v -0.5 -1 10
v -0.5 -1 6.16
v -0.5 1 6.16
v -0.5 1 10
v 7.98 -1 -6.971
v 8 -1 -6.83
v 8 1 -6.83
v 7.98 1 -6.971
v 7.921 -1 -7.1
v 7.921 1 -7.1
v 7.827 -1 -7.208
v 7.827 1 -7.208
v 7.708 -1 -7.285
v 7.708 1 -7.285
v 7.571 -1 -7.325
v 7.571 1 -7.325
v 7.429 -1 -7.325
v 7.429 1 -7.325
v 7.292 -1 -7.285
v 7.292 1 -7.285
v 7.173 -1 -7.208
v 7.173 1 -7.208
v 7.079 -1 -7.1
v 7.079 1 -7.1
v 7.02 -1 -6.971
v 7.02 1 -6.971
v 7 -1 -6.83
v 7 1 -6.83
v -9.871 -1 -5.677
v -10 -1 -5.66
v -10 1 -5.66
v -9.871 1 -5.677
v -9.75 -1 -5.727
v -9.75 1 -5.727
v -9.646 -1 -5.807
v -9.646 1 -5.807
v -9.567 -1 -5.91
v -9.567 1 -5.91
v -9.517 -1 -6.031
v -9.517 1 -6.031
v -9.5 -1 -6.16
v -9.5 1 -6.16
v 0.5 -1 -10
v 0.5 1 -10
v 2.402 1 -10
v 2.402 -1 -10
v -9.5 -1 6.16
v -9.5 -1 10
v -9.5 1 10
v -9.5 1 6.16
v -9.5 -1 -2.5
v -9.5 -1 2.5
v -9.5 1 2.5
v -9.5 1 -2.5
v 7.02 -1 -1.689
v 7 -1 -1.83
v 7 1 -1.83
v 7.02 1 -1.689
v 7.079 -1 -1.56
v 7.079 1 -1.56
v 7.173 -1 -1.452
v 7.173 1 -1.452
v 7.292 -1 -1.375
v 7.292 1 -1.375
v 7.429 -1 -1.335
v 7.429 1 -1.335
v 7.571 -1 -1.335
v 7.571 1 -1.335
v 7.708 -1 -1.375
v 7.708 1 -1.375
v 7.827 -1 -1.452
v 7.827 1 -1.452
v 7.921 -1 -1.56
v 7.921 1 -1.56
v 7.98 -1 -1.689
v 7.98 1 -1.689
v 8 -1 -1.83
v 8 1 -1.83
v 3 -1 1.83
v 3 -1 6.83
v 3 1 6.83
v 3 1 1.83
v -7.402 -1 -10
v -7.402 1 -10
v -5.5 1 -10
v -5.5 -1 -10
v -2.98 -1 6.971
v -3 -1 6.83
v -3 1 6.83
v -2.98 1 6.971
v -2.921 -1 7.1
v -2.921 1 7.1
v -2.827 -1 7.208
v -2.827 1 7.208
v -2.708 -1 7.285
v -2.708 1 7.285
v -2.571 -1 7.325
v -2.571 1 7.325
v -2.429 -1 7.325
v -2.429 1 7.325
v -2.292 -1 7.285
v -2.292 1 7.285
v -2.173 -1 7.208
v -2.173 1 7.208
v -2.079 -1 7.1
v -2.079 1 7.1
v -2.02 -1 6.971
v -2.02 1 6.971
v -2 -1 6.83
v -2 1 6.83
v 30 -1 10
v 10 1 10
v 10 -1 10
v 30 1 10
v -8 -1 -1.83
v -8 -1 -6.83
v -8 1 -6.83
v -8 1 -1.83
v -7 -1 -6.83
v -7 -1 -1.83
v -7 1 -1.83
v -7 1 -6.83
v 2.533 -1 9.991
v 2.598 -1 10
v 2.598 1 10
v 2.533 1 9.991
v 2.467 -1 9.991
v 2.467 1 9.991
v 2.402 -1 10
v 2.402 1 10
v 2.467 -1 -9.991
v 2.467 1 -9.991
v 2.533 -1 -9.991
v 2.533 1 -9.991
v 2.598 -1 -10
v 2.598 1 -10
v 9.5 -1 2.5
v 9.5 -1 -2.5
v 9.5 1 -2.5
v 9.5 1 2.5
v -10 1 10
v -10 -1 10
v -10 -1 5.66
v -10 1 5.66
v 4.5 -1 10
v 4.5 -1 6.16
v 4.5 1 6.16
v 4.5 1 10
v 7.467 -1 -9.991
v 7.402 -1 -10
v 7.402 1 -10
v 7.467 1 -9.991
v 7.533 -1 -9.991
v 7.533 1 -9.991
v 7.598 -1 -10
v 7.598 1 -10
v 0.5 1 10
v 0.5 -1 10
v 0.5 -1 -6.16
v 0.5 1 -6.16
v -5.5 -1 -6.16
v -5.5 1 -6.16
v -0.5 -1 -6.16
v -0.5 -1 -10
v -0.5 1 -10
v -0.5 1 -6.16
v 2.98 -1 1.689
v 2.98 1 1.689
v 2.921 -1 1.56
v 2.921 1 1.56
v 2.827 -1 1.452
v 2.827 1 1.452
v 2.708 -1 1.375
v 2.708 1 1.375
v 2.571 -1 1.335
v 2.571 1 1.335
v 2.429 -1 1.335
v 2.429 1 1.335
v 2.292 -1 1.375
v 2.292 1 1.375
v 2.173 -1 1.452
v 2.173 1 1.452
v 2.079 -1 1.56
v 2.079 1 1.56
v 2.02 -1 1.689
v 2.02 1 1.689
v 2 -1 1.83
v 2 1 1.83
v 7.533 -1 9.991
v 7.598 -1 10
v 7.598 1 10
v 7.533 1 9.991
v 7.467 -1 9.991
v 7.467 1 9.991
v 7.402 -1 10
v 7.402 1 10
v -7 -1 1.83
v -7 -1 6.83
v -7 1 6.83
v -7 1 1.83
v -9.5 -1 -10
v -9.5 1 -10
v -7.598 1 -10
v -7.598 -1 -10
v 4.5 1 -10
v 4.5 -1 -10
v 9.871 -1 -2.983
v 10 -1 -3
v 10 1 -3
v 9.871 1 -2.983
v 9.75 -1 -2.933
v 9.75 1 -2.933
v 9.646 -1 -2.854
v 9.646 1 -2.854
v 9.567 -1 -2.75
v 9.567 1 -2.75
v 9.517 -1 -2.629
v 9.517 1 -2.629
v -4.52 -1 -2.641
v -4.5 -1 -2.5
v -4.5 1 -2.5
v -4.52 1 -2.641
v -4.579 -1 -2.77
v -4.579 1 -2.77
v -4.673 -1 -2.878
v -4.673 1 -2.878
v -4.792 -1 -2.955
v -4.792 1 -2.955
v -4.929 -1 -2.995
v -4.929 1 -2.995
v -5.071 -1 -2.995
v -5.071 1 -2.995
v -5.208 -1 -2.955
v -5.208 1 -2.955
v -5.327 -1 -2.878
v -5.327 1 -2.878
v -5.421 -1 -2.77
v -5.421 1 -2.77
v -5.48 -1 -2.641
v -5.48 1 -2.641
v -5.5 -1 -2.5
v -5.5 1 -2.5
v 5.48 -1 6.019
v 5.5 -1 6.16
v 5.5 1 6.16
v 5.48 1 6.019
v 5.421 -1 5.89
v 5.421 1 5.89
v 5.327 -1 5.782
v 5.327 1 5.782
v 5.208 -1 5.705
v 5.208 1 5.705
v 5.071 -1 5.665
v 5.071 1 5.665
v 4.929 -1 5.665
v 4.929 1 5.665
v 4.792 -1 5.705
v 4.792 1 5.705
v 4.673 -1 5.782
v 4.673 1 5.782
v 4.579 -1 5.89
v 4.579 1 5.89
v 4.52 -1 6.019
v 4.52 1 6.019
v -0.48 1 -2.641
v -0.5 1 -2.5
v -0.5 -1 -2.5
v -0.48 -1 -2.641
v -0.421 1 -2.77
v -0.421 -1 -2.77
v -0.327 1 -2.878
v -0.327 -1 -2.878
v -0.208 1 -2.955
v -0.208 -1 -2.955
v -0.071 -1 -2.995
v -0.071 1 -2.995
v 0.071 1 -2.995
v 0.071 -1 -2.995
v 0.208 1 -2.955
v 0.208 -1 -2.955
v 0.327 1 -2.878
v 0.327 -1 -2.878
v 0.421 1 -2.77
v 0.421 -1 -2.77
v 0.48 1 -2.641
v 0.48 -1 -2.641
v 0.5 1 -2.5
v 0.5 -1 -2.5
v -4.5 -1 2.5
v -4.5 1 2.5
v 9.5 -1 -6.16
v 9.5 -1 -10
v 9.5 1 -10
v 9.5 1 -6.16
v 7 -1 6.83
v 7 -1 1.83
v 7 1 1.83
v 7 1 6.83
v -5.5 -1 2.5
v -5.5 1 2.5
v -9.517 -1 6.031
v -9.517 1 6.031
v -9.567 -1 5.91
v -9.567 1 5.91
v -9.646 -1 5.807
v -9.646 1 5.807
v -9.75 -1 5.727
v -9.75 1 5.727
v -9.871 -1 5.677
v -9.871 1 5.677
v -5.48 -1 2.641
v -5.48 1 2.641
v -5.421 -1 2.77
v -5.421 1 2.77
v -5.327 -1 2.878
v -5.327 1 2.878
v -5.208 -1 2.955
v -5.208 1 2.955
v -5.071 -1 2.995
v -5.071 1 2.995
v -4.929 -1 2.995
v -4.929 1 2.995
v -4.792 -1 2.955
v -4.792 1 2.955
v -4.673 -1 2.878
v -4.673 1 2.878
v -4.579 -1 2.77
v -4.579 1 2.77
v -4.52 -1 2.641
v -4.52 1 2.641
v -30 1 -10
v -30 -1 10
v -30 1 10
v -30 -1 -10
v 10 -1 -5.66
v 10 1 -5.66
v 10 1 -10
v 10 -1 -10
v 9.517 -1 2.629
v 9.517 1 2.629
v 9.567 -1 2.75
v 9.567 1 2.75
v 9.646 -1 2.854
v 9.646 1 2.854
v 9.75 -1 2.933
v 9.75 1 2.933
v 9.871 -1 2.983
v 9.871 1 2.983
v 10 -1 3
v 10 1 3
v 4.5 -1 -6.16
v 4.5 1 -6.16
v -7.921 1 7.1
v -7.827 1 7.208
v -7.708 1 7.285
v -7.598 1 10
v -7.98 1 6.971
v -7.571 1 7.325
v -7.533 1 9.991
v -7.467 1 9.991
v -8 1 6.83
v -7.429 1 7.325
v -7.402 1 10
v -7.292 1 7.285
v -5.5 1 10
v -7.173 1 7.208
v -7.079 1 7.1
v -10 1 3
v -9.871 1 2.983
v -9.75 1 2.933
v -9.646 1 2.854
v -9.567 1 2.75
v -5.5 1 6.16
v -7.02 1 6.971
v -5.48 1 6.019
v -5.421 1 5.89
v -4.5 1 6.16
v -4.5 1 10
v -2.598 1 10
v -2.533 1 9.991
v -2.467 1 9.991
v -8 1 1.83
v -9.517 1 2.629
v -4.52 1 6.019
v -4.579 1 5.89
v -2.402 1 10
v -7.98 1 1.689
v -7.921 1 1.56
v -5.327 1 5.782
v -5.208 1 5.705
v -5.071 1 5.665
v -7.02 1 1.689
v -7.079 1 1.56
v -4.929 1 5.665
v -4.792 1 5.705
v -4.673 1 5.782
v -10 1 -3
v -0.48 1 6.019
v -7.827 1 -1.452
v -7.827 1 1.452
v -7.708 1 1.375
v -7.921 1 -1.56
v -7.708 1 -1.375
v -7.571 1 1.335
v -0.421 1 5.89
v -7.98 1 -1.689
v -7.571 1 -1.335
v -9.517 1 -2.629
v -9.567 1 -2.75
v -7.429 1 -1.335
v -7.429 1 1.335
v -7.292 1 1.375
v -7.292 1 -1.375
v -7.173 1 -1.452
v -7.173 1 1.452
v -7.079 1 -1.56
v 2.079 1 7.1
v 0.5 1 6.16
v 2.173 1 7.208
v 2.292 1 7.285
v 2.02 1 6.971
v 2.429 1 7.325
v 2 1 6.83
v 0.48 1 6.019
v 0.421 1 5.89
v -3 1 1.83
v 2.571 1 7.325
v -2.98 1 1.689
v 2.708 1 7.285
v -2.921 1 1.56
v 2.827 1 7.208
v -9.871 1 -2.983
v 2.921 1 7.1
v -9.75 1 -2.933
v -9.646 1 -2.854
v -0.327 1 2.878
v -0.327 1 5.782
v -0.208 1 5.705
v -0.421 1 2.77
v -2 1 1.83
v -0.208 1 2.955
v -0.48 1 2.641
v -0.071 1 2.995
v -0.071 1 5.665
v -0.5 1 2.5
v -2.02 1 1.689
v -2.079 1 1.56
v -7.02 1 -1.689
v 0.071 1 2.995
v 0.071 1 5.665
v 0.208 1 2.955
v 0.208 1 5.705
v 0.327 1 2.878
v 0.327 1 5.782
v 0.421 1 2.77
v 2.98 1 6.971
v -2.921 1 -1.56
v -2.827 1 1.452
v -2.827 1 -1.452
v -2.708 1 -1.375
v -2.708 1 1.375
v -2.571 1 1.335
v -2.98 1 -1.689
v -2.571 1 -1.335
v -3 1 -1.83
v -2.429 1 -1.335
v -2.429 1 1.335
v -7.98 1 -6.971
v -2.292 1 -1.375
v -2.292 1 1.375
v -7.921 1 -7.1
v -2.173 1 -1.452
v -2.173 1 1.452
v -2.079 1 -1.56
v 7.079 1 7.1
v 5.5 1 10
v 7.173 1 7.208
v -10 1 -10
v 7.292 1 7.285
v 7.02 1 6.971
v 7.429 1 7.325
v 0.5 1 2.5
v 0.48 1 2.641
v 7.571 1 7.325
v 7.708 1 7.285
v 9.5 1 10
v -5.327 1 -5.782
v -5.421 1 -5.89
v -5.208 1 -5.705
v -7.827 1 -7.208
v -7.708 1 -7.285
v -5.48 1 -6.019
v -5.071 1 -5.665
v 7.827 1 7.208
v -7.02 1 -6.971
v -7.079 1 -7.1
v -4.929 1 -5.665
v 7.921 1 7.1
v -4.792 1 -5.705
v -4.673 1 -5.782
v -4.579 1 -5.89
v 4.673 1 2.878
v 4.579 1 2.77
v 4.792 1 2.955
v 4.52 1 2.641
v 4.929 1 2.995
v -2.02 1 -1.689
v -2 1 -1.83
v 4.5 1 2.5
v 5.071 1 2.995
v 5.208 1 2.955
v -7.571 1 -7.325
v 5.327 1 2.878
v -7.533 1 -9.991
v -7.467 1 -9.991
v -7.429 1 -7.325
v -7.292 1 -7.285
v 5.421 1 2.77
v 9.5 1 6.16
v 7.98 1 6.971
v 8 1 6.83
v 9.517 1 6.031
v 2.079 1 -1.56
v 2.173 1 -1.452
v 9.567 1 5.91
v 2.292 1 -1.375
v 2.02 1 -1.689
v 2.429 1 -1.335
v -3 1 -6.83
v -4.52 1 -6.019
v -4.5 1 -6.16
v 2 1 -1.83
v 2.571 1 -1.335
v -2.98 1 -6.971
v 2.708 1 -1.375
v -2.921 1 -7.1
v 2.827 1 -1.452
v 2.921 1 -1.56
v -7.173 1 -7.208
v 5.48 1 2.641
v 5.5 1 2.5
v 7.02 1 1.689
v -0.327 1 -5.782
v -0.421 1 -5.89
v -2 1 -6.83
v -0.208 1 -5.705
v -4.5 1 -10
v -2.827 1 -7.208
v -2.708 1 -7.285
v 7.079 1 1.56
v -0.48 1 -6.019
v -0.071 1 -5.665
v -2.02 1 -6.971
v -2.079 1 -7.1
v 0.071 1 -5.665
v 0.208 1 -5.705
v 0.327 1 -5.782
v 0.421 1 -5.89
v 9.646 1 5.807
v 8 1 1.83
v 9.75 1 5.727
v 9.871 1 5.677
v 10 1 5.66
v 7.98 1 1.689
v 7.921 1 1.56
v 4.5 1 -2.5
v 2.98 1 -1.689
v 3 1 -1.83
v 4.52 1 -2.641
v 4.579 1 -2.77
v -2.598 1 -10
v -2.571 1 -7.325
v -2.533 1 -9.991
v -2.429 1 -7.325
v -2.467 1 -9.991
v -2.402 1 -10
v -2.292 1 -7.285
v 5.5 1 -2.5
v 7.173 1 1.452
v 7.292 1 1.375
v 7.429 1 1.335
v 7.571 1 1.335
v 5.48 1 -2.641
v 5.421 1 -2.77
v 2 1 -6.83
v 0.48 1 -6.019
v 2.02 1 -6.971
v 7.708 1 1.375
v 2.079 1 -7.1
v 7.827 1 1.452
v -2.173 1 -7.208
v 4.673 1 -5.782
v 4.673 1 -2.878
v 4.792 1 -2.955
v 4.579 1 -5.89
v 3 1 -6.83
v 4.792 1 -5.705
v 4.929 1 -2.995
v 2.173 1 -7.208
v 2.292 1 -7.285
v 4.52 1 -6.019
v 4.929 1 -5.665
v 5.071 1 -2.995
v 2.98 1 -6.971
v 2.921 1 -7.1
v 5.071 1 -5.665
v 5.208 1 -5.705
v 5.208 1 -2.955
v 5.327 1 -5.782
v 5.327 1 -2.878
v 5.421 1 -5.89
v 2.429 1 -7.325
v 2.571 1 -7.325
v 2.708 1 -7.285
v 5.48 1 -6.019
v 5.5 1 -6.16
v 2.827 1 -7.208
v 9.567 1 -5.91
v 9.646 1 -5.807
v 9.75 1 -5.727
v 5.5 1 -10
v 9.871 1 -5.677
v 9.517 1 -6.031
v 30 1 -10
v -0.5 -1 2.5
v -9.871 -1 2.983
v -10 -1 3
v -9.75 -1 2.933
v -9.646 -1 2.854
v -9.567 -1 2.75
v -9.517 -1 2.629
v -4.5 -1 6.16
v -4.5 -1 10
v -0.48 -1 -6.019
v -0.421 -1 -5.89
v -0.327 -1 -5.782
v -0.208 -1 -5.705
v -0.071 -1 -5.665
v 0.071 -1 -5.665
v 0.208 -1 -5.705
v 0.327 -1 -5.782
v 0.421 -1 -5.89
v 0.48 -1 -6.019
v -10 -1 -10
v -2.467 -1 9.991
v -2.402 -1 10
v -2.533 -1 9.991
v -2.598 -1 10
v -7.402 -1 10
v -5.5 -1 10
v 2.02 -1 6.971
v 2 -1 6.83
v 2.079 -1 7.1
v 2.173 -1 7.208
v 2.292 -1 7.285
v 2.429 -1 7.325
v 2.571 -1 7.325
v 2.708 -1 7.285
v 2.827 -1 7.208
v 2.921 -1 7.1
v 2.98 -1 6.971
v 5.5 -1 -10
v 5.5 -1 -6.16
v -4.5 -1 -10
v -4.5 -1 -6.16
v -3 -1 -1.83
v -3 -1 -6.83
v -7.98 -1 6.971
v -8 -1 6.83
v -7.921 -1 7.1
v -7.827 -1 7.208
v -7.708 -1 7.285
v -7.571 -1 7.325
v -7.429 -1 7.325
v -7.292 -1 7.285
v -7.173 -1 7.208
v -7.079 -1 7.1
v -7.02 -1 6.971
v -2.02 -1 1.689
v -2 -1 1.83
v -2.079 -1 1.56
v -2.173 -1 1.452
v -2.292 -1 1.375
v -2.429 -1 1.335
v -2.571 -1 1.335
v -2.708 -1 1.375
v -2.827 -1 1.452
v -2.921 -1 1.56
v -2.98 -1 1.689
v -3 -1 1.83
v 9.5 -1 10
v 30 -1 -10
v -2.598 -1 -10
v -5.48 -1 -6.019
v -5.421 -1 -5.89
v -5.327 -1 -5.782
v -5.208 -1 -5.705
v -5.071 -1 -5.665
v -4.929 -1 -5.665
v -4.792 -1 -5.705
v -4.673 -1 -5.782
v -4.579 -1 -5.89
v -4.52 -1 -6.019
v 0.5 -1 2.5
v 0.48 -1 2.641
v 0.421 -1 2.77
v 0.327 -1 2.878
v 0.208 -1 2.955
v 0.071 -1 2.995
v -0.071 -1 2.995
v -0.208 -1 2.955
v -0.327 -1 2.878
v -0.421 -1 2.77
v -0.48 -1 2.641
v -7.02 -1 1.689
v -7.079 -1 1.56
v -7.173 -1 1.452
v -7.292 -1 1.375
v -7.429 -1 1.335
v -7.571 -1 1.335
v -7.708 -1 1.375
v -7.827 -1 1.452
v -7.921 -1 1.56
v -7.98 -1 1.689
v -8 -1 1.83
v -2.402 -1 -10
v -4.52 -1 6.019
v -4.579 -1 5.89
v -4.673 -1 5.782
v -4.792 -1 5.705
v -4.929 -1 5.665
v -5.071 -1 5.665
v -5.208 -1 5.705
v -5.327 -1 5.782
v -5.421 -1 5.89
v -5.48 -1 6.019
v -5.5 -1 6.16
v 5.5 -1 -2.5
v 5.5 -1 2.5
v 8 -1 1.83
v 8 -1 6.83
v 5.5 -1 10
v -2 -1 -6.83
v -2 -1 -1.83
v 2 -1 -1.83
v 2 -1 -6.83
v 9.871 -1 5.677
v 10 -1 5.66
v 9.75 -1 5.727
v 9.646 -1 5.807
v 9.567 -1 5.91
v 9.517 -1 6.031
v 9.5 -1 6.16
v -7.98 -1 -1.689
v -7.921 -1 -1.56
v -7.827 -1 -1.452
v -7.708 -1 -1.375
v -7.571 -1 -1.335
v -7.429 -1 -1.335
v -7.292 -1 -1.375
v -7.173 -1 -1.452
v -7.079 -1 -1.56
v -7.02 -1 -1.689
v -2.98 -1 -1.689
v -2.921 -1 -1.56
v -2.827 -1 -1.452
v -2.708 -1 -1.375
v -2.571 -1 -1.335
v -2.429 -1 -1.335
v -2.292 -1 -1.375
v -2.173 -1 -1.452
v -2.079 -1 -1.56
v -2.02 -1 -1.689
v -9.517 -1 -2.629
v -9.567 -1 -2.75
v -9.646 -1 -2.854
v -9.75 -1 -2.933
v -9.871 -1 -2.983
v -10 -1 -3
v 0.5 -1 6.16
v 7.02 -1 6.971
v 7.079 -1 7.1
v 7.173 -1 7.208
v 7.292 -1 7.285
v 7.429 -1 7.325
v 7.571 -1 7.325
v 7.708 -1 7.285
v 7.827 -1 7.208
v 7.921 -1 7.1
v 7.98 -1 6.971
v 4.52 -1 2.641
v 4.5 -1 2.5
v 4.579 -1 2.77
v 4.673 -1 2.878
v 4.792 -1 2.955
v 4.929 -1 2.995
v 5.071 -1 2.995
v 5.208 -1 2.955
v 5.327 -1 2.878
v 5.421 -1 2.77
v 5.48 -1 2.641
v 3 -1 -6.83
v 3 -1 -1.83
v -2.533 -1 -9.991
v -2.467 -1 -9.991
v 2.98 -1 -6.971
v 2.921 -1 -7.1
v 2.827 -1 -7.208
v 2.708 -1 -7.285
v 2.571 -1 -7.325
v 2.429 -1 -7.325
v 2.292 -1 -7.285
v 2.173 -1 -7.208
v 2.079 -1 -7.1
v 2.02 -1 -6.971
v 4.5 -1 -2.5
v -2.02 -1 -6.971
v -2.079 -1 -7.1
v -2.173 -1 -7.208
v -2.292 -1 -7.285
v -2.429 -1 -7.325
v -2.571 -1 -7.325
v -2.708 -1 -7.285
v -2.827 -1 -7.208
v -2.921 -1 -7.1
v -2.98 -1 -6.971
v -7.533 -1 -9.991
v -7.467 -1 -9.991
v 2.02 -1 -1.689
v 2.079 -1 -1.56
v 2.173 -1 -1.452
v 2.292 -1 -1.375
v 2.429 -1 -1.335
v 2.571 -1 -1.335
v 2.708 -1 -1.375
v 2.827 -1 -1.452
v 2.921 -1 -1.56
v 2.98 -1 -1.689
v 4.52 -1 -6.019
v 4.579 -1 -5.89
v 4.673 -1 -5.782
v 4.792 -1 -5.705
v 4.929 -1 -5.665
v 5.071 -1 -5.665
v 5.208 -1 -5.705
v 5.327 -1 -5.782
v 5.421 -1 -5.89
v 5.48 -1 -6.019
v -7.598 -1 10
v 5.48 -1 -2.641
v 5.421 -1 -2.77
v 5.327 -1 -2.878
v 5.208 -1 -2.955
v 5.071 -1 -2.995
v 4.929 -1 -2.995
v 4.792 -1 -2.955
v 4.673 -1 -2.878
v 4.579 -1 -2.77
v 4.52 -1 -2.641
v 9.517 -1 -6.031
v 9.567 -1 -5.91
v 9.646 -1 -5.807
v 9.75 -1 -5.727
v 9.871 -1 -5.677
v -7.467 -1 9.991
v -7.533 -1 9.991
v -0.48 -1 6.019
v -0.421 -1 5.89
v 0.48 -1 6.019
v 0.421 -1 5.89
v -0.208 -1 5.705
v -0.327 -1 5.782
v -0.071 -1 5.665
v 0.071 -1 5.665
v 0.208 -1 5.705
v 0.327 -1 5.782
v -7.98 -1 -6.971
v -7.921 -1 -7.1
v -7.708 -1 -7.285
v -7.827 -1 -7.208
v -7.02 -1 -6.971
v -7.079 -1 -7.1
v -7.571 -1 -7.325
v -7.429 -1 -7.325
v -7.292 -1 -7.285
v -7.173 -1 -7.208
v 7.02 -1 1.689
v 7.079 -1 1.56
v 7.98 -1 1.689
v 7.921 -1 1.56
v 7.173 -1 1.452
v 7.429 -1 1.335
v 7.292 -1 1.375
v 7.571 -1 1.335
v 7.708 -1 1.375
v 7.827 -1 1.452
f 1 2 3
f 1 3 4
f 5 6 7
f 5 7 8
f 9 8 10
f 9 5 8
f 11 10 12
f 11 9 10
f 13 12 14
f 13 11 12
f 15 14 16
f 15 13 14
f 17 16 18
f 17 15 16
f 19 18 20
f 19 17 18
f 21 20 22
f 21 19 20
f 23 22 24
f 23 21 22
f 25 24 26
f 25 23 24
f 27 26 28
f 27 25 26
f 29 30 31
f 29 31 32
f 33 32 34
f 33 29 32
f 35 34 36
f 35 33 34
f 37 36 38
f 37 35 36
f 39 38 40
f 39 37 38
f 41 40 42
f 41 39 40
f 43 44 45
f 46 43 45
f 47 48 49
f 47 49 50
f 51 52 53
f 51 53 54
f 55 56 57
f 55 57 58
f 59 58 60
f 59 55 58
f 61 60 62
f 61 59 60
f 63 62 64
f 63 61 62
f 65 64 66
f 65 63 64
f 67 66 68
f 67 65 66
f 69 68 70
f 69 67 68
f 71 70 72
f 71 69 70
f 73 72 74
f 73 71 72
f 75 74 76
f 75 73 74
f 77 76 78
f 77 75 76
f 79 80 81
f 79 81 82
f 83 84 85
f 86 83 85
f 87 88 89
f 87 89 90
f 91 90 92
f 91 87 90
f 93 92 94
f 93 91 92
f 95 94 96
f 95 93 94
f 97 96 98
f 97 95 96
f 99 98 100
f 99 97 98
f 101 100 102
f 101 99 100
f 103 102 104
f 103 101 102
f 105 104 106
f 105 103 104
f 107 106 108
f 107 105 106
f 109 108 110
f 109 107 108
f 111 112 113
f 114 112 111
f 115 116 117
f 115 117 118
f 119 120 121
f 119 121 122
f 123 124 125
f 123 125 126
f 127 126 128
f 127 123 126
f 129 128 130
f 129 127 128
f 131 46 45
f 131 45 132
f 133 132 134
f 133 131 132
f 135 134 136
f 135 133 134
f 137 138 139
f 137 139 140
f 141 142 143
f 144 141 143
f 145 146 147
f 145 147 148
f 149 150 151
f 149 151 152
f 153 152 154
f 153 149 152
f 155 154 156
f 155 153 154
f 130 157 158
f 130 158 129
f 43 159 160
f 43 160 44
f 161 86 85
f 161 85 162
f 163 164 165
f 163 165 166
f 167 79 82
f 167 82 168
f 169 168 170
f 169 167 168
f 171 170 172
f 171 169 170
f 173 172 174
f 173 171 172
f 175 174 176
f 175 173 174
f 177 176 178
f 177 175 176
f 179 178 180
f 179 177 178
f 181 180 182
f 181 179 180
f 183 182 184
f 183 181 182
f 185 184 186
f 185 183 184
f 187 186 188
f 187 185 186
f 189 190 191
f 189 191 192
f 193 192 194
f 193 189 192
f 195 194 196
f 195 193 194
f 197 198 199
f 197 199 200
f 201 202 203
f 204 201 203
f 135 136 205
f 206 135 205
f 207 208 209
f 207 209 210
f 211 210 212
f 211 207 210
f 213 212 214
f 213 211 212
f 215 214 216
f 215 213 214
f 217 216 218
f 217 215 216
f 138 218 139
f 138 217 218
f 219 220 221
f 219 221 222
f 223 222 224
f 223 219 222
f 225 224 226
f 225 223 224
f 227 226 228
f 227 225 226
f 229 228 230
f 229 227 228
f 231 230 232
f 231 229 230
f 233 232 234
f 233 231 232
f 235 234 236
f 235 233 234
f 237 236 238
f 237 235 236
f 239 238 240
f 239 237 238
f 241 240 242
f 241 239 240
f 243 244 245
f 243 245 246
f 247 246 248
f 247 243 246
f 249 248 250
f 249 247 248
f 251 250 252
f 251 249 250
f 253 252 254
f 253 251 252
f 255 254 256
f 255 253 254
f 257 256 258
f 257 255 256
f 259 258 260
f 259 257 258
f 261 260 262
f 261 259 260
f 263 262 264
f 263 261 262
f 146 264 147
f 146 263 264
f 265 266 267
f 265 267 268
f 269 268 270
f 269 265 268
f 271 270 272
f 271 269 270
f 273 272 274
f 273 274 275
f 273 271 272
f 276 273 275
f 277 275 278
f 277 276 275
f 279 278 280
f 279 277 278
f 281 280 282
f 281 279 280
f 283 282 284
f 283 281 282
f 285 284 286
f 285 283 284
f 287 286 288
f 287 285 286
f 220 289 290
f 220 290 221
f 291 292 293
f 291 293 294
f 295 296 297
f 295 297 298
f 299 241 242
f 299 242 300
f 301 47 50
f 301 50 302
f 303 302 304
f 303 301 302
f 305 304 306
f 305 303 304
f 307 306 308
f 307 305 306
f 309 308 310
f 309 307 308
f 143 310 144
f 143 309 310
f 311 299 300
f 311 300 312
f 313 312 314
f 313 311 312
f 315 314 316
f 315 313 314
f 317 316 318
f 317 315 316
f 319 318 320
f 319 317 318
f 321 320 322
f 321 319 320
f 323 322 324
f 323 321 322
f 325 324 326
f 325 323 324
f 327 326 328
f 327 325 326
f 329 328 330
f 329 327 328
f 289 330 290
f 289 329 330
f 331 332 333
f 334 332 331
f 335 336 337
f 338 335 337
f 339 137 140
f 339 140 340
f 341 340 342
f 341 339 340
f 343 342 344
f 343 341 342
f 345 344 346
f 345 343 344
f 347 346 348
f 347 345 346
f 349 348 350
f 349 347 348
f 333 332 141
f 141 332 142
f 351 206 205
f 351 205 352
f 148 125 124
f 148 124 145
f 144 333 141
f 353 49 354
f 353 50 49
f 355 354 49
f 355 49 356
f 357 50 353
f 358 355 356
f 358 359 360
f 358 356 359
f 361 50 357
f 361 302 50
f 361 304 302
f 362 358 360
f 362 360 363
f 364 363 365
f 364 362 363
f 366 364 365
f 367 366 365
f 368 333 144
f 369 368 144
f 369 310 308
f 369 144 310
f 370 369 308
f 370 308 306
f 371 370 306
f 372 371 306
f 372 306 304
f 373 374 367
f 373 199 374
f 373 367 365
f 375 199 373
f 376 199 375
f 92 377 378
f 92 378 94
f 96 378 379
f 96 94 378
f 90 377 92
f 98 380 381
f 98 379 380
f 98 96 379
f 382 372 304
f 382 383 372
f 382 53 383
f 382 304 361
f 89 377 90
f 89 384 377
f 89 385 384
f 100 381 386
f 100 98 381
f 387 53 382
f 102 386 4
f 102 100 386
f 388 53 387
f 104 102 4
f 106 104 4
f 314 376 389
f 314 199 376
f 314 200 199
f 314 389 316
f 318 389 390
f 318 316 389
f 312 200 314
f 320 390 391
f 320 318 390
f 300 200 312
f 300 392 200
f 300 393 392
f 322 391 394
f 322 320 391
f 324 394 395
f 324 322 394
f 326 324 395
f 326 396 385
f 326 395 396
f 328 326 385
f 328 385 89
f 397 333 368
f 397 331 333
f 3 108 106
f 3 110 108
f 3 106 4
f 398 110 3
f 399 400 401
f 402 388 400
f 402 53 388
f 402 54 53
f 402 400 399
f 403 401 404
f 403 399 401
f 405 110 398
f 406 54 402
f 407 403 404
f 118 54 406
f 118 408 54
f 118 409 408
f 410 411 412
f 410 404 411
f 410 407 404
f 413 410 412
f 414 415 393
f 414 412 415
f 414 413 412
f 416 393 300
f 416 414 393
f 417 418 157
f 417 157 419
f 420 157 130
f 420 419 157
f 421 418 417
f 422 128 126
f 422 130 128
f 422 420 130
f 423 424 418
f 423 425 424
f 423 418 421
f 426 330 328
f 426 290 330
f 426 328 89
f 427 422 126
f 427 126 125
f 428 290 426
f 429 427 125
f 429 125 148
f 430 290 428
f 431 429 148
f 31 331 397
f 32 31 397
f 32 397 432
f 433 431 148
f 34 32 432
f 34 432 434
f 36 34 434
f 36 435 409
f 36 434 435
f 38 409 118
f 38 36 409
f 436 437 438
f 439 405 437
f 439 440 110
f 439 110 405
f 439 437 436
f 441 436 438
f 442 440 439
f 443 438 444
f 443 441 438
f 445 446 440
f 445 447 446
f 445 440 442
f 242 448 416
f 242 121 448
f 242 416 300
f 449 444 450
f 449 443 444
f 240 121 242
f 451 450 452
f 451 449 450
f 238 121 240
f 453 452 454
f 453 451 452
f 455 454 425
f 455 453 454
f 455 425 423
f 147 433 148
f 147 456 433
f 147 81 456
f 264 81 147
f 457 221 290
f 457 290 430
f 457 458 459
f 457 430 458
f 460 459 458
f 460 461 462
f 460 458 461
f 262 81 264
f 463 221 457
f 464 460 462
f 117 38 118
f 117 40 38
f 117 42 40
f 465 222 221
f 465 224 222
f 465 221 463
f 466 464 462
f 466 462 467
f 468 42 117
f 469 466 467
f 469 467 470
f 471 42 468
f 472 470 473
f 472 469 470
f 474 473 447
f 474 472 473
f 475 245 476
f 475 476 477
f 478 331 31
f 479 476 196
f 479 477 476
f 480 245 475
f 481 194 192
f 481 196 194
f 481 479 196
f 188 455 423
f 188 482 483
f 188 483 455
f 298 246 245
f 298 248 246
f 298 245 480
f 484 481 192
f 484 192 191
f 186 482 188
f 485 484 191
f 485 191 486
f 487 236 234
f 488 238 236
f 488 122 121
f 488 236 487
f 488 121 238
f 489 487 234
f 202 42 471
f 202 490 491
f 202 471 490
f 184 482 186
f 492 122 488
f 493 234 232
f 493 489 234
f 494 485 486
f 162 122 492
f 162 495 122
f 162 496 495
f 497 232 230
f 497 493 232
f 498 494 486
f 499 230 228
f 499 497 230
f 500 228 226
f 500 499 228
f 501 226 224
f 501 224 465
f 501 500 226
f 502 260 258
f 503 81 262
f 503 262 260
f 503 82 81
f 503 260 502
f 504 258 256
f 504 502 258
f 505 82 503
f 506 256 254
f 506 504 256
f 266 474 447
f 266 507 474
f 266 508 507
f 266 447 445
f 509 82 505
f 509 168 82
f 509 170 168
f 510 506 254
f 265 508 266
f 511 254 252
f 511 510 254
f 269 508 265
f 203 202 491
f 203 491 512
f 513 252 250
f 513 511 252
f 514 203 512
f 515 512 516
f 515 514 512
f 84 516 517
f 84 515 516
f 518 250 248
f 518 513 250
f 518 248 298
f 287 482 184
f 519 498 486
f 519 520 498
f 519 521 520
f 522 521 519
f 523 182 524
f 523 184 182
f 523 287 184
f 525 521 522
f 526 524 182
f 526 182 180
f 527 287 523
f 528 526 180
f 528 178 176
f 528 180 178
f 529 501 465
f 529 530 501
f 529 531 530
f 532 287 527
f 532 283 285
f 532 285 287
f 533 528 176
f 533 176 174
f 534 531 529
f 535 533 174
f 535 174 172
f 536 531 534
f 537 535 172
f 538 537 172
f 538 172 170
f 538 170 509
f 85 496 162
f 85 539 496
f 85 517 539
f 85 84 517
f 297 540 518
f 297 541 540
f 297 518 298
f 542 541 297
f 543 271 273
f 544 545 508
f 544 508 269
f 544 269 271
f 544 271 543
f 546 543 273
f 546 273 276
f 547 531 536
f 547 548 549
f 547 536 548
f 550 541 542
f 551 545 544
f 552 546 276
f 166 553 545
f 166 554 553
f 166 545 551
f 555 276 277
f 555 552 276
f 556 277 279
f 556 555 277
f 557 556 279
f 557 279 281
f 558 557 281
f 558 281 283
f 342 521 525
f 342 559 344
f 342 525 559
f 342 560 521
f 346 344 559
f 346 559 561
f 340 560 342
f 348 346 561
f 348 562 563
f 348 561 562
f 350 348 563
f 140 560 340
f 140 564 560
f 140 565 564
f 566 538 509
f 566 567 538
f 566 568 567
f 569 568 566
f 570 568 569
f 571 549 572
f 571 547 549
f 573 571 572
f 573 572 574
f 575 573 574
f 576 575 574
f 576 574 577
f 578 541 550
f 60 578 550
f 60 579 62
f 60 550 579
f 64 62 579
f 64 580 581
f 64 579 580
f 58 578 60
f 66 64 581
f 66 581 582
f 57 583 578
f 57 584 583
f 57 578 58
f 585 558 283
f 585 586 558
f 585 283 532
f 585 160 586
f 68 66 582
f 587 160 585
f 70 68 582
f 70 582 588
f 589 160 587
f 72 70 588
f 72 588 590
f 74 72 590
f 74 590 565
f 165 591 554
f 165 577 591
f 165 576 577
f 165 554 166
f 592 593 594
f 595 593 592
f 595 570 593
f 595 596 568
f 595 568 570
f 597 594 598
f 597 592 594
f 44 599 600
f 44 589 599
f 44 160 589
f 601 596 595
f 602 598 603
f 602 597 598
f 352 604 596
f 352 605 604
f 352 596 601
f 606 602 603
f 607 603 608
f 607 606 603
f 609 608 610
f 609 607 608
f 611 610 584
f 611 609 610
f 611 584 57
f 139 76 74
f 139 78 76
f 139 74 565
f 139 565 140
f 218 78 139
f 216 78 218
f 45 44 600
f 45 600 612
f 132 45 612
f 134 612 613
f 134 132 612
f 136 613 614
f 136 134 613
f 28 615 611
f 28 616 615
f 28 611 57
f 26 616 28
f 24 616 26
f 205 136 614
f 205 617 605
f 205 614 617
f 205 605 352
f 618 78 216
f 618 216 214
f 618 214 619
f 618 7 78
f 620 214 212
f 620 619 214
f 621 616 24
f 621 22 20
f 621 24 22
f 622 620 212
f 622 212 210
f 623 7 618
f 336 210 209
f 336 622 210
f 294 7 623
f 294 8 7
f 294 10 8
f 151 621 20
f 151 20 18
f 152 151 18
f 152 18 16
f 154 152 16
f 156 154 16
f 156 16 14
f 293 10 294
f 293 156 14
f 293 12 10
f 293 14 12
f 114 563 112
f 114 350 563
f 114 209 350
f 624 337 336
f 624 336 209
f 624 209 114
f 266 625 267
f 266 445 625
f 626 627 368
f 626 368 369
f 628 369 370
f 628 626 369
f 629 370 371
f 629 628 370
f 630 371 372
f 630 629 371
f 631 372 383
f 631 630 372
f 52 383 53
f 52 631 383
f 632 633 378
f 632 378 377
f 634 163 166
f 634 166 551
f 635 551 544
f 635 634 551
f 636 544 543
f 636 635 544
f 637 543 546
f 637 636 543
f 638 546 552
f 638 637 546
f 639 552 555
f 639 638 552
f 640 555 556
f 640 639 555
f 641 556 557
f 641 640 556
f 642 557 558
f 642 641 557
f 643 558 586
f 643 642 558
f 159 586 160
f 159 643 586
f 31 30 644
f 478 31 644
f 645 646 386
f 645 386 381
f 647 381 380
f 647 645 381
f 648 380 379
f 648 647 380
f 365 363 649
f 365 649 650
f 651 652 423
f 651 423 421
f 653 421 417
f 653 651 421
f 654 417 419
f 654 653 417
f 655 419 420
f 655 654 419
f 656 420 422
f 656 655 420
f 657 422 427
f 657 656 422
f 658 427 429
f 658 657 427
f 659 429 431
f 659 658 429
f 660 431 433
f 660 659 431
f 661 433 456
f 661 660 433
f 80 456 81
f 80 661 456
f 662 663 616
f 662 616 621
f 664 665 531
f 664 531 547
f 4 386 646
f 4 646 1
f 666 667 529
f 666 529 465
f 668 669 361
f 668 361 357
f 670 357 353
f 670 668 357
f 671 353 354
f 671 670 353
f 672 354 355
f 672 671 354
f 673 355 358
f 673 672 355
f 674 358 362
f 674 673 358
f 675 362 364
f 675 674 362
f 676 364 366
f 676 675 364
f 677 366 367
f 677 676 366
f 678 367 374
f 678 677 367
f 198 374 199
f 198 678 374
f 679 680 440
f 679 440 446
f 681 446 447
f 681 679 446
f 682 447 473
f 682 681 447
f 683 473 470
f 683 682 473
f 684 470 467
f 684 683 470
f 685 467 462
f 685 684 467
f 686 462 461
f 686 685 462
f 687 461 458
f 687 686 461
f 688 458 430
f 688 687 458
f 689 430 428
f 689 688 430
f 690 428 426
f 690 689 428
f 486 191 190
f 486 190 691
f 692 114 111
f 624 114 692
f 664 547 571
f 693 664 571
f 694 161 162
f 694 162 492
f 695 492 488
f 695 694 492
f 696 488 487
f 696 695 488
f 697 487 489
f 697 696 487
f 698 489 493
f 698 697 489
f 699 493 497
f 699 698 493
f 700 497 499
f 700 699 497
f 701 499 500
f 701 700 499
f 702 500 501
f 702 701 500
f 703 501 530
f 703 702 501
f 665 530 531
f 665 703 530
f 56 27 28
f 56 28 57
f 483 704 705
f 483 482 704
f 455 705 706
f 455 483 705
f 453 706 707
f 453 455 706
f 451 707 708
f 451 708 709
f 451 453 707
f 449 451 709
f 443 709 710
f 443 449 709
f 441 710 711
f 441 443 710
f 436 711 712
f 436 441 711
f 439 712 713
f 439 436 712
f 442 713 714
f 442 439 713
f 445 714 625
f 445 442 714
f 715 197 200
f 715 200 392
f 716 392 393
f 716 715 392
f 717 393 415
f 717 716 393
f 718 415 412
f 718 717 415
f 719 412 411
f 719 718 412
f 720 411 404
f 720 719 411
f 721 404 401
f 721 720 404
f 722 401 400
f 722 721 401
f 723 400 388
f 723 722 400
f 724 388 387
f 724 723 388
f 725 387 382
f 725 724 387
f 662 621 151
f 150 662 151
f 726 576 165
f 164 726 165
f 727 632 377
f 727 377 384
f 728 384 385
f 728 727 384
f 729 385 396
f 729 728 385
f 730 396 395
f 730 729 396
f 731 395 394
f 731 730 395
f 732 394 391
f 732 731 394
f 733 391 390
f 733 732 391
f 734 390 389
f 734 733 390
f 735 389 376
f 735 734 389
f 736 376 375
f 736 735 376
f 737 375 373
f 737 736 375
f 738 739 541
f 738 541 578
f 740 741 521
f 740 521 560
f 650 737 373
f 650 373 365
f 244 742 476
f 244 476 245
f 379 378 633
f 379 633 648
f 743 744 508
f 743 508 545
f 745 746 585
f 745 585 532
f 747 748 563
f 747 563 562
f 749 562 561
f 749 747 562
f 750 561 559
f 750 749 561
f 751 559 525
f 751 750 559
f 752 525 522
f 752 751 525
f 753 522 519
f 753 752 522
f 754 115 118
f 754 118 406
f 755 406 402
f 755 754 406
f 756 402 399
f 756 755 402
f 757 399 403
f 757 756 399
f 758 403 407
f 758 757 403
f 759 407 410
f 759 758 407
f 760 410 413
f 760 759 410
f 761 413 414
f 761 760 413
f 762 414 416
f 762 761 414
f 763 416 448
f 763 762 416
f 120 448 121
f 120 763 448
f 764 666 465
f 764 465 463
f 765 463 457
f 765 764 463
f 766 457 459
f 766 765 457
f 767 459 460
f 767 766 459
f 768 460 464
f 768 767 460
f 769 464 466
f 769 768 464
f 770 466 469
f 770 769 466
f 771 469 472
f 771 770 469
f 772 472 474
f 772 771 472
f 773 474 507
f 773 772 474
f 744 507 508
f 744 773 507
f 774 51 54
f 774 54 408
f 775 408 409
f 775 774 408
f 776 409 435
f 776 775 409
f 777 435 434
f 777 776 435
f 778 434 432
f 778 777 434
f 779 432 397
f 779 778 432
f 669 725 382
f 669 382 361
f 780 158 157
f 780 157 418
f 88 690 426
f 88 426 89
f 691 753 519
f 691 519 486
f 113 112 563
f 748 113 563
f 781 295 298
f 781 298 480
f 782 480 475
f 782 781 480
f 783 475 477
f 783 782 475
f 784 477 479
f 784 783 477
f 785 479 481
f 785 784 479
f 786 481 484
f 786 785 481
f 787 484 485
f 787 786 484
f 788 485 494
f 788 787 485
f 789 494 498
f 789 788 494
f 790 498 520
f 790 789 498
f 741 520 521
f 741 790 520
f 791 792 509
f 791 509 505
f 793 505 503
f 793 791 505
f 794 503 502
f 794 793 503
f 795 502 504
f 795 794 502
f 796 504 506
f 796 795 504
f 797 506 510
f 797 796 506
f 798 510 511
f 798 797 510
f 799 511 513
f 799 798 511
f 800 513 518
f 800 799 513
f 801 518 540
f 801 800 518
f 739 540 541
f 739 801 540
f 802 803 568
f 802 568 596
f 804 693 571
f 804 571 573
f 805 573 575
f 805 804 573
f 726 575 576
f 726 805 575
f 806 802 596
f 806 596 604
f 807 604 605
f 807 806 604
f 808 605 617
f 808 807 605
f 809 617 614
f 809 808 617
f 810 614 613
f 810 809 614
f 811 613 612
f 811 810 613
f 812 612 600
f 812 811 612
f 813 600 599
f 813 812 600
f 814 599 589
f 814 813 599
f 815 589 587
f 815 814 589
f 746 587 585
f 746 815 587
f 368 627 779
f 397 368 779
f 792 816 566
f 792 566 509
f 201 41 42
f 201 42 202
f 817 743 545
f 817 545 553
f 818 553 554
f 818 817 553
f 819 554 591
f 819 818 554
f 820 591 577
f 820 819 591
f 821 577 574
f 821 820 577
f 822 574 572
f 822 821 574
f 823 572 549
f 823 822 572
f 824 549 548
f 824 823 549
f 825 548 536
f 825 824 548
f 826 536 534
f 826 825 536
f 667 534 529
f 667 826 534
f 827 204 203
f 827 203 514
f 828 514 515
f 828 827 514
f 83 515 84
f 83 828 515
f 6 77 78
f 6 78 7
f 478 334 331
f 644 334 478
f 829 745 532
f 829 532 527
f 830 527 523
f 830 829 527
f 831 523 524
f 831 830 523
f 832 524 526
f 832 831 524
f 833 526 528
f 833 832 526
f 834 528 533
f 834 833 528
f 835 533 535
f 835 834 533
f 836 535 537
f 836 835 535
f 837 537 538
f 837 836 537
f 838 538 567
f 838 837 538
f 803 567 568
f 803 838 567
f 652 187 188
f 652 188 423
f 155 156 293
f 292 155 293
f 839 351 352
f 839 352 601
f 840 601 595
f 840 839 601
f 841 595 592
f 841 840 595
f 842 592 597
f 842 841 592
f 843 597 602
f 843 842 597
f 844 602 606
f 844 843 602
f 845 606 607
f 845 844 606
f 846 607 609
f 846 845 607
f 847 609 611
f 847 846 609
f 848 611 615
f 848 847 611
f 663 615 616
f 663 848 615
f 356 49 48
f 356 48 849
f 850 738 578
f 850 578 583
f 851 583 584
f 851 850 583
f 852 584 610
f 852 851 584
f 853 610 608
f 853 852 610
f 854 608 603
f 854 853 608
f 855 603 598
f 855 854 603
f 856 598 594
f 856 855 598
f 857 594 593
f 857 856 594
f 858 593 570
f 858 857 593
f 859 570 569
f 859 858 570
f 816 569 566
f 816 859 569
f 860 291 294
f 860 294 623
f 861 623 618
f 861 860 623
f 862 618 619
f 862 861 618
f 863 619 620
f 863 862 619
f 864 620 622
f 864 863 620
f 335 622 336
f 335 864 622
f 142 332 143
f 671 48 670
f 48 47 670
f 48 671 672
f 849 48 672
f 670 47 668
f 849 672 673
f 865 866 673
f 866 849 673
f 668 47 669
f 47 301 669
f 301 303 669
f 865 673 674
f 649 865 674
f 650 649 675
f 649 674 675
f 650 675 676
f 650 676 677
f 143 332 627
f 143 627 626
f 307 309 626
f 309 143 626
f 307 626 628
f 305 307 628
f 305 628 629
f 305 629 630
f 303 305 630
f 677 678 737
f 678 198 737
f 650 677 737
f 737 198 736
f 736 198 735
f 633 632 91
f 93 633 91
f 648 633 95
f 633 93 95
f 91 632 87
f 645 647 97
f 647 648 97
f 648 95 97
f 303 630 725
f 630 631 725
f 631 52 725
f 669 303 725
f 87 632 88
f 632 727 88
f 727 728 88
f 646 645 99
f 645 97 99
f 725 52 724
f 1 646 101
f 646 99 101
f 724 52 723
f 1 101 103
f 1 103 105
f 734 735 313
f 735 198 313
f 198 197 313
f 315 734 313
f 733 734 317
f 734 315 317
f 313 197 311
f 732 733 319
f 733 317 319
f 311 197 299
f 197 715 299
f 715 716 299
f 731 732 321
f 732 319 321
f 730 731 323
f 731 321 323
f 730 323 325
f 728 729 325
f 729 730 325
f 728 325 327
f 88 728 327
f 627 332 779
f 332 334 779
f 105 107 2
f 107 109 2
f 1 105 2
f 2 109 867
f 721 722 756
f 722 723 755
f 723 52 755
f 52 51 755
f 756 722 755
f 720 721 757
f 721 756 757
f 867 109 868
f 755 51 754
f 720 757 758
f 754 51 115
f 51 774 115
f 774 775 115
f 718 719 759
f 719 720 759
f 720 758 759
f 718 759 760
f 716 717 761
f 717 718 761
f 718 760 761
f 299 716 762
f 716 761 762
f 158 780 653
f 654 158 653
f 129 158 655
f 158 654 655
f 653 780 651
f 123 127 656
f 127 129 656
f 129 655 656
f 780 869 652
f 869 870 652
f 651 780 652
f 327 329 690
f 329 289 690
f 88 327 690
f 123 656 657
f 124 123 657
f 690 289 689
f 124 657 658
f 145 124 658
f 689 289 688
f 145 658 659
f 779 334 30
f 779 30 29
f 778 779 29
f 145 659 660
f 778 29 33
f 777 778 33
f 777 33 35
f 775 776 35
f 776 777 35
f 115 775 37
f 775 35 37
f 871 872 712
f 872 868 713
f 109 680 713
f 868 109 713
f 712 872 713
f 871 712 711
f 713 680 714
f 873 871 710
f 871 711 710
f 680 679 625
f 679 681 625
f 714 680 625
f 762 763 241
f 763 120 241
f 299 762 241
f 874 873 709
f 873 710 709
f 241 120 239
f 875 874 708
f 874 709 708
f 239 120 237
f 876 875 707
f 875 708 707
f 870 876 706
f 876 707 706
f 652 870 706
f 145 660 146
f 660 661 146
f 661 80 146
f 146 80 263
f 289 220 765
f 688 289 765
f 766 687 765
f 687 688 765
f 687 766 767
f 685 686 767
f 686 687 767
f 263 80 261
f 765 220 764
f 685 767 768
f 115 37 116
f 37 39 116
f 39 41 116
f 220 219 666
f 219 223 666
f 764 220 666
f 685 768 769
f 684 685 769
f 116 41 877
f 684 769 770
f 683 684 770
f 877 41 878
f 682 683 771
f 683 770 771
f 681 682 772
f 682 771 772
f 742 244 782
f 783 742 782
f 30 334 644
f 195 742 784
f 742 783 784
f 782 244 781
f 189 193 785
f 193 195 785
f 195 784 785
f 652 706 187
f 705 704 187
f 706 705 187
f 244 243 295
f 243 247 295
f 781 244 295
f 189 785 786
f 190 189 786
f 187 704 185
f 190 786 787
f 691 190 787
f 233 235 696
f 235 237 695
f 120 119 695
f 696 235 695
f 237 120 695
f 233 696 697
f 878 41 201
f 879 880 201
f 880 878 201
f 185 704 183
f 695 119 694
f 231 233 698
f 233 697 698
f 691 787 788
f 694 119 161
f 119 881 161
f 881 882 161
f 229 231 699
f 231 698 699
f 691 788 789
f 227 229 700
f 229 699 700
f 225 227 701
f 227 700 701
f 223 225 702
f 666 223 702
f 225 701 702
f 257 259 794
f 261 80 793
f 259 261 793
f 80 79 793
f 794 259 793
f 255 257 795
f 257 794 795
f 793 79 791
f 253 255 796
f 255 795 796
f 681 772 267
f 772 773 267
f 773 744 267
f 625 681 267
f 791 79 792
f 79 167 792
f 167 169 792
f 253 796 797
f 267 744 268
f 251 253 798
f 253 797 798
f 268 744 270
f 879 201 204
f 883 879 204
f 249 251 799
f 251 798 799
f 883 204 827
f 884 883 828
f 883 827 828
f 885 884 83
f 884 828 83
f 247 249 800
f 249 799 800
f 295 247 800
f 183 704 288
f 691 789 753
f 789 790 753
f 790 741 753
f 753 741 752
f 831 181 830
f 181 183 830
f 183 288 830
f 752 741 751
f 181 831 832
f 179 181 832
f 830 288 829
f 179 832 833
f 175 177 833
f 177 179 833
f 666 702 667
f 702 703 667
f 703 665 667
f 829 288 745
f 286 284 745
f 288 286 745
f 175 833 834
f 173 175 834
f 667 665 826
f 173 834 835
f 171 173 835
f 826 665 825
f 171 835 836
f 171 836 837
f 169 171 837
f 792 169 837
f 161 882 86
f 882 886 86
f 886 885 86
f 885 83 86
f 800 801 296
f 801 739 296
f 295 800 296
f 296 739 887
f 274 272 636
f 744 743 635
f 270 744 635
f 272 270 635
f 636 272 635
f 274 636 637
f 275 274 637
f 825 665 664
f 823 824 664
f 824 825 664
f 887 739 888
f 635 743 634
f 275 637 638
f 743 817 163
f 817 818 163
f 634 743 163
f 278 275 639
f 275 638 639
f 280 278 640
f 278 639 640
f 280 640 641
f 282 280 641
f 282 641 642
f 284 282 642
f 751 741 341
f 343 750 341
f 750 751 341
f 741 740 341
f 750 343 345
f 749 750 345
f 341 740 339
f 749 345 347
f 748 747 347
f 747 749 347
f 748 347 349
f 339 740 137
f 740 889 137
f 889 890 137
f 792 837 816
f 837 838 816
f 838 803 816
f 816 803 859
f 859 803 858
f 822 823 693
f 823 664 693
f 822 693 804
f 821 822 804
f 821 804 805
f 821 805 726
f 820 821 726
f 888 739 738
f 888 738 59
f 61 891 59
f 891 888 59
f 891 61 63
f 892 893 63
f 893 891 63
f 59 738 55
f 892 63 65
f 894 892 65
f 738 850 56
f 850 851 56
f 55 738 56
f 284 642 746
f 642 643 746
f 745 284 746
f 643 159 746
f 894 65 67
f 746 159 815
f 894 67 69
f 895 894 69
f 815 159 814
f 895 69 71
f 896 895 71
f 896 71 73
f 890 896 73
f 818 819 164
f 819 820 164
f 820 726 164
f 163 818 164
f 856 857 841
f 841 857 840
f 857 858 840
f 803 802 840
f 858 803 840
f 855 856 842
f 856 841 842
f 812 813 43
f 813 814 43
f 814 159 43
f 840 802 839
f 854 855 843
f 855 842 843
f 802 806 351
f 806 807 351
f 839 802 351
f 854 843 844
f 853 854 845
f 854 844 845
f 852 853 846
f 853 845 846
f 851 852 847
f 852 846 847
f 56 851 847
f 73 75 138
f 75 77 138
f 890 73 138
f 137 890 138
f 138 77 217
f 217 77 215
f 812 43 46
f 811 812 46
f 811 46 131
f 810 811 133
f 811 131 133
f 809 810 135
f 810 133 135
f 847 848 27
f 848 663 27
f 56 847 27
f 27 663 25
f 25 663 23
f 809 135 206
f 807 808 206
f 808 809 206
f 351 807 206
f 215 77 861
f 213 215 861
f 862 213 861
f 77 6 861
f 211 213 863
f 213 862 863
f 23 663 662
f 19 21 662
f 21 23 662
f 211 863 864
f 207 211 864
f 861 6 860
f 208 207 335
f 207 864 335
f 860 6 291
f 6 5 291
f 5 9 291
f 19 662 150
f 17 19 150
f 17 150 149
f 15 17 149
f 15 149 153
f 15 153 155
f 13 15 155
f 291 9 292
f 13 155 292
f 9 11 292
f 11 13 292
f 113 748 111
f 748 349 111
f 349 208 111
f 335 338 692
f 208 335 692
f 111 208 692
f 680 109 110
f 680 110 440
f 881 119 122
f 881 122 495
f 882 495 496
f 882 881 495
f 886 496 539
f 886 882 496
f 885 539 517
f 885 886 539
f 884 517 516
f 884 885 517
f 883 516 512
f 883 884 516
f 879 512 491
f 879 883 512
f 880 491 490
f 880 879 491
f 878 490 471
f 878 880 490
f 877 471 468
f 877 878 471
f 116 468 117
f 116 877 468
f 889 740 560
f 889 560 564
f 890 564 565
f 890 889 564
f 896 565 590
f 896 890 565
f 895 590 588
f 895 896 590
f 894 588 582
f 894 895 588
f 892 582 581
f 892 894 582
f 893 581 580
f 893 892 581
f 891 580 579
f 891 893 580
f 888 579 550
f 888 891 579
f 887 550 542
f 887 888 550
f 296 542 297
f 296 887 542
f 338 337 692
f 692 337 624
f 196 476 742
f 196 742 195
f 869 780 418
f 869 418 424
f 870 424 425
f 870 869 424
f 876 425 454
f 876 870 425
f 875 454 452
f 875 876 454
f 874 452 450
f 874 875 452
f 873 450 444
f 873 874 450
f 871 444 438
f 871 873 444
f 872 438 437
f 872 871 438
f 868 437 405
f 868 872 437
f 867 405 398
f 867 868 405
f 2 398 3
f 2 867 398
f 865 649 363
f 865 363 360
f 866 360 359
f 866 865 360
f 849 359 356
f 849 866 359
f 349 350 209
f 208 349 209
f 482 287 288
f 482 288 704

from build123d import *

# Parameters (mm, degrees)
SKETCH1_W           = 20
SKETCH1_H           = 20
BOSS_EXTRUDE1_DEPTH = 1
CUT_EXTRUDE1_DEPTH  = 1
FILL_START          = -1
FILL_PATTERN1_DEPTH = 2
SKETCH2_W           = 20
SKETCH2_H           = 20
BOSS_EXTRUDE2_DEPTH = 1


# Read off the part's stored shape, not the designer's step: Fill Pattern1
with BuildPart() as part:
    # Sketch1 → Boss-Extrude1 (new, symmetric)
    with BuildSketch(Plane(origin=(0, 0, 0), x_dir=(1, 0, 0), z_dir=(0, 1, 0))):
        Rectangle(SKETCH1_W, SKETCH1_H)
    extrude(amount=BOSS_EXTRUDE1_DEPTH, both=True)

    # Sketch1<4> → Cut-Extrude1 (cut, symmetric)
    with BuildSketch(Plane(origin=(0, 0, 0), x_dir=(1, 0, 0), z_dir=(0, 1, 0))):
        with BuildLine():
            Line((0.5, 2.5), (0.5, -2.5))
            ThreePointArc((0.5, -2.5), (0, -3), (-0.5, -2.5))
            Line((-0.5, -2.5), (-0.5, 2.5))
            ThreePointArc((-0.5, 2.5), (0, 3), (0.5, 2.5))
        make_face()
    extrude(amount=CUT_EXTRUDE1_DEPTH, both=True, mode=Mode.SUBTRACT)

    # Fill Pattern1 outline → Fill Pattern1 (cut)
    with BuildSketch(Plane(origin=(0, 0, 0), x_dir=(1, 0, 0), z_dir=(0, 1, 0)).offset(FILL_START)):
        with BuildLine():
            Line((0.5, -10), (0.5, -6.160254038))
            ThreePointArc((0.5, -6.160254038), (0, -5.660254038), (-0.5, -6.160254038))
            Line((-0.5, -6.160254038), (-0.5, -10))
            Line((-0.5, -10), (0.5, -10))
        make_face()
        with BuildLine():
            ThreePointArc((2.597603377, -10), (2.5, -9.990381057), (2.402396623, -10))
            Line((2.402396623, -10), (2.597603377, -10))
        make_face()
        with BuildLine():
            Line((-2.597603377, -10), (-2.402396623, -10))
            ThreePointArc((-2.402396623, -10), (-2.5, -9.990381057), (-2.597603377, -10))
        make_face()
        with BuildLine():
            Line((4.5, -6.160254038), (4.5, -10))
            Line((4.5, -10), (5.5, -10))
            Line((5.5, -10), (5.5, -6.160254038))
            ThreePointArc((5.5, -6.160254038), (5, -5.660254038), (4.5, -6.160254038))
        make_face()
        with BuildLine():
            Line((-5.5, -10), (-4.5, -10))
            Line((-4.5, -10), (-4.5, -6.160254038))
            ThreePointArc((-4.5, -6.160254038), (-5, -5.660254038), (-5.5, -6.160254038))
            Line((-5.5, -6.160254038), (-5.5, -10))
        make_face()
        with BuildLine():
            ThreePointArc((7.597603377, -10), (7.5, -9.990381057), (7.402396623, -10))
            Line((7.402396623, -10), (7.597603377, -10))
        make_face()
        with BuildLine():
            Line((-7.597603377, -10), (-7.402396623, -10))
            ThreePointArc((-7.402396623, -10), (-7.5, -9.990381057), (-7.597603377, -10))
        make_face()
        with BuildLine():
            Line((9.5, -6.160254038), (9.5, -10))
            Line((9.5, -10), (10, -10))
            Line((10, -10), (10, -5.660254038))
            ThreePointArc((10, -5.660254038), (9.646446609, -5.806700647), (9.5, -6.160254038))
        make_face()
        with BuildLine():
            Line((-10, -10), (-9.5, -10))
            Line((-9.5, -10), (-9.5, -6.160254038))
            ThreePointArc((-9.5, -6.160254038), (-9.646446609, -5.806700647), (-10, -5.660254038))
            Line((-10, -5.660254038), (-10, -10))
        make_face()
        with BuildLine():
            ThreePointArc((9.5, -2.5), (9.646446609, -2.853553391), (10, -3))
            Line((10, -3), (10, 3))
            ThreePointArc((10, 3), (9.646446609, 2.853553391), (9.5, 2.5))
            Line((9.5, 2.5), (9.5, -2.5))
        make_face()
        with BuildLine():
            Line((-10, 3), (-10, -3))
            ThreePointArc((-10, -3), (-9.646446609, -2.853553391), (-9.5, -2.5))
            Line((-9.5, -2.5), (-9.5, 2.5))
            ThreePointArc((-9.5, 2.5), (-9.646446609, 2.853553391), (-10, 3))
        make_face()
        with BuildLine():
            ThreePointArc((9.5, 6.160254038), (9.646446609, 5.806700647), (10, 5.660254038))
            Line((10, 5.660254038), (10, 10))
            Line((10, 10), (9.5, 10))
            Line((9.5, 10), (9.5, 6.160254038))
        make_face()
        with BuildLine():
            Line((-10, 10), (-10, 5.660254038))
            ThreePointArc((-10, 5.660254038), (-9.646446609, 5.806700647), (-9.5, 6.160254038))
            Line((-9.5, 6.160254038), (-9.5, 10))
            Line((-9.5, 10), (-10, 10))
        make_face()
        with BuildLine():
            ThreePointArc((7.402396623, 10), (7.5, 9.990381057), (7.597603377, 10))
            Line((7.597603377, 10), (7.402396623, 10))
        make_face()
        with BuildLine():
            Line((-7.402396623, 10), (-7.597603377, 10))
            ThreePointArc((-7.597603377, 10), (-7.5, 9.990381057), (-7.402396623, 10))
        make_face()
        with BuildLine():
            Line((5.5, 6.160254038), (5.5, 10))
            Line((5.5, 10), (4.5, 10))
            Line((4.5, 10), (4.5, 6.160254038))
            ThreePointArc((4.5, 6.160254038), (5, 5.660254038), (5.5, 6.160254038))
        make_face()
        with BuildLine():
            Line((-4.5, 10), (-5.5, 10))
            Line((-5.5, 10), (-5.5, 6.160254038))
            ThreePointArc((-5.5, 6.160254038), (-5, 5.660254038), (-4.5, 6.160254038))
            Line((-4.5, 6.160254038), (-4.5, 10))
        make_face()
        with BuildLine():
            ThreePointArc((2.402396623, 10), (2.5, 9.990381057), (2.597603377, 10))
            Line((2.597603377, 10), (2.402396623, 10))
        make_face()
        with BuildLine():
            Line((-2.402396623, 10), (-2.597603377, 10))
            ThreePointArc((-2.597603377, 10), (-2.5, 9.990381057), (-2.402396623, 10))
        make_face()
        with BuildLine():
            Line((0.5, 6.160254038), (0.5, 10))
            Line((0.5, 10), (-0.5, 10))
            Line((-0.5, 10), (-0.5, 6.160254038))
            ThreePointArc((-0.5, 6.160254038), (0, 5.660254038), (0.5, 6.160254038))
        make_face()
        with BuildLine():
            Line((8, -6.830127019), (8, -1.830127019))
            ThreePointArc((8, -1.830127019), (7.5, -1.330127019), (7, -1.830127019))
            Line((7, -1.830127019), (7, -6.830127019))
            ThreePointArc((7, -6.830127019), (7.5, -7.330127019), (8, -6.830127019))
        make_face()
        with BuildLine():
            Line((8, 1.830127019), (8, 6.830127019))
            ThreePointArc((8, 6.830127019), (7.5, 7.330127019), (7, 6.830127019))
            Line((7, 6.830127019), (7, 1.830127019))
            ThreePointArc((7, 1.830127019), (7.5, 1.330127019), (8, 1.830127019))
        make_face()
        with BuildLine():
            Line((5.5, -2.5), (5.5, 2.5))
            ThreePointArc((5.5, 2.5), (5, 3), (4.5, 2.5))
            Line((4.5, 2.5), (4.5, -2.5))
            ThreePointArc((4.5, -2.5), (5, -3), (5.5, -2.5))
        make_face()
        with BuildLine():
            Line((-7, 1.830127019), (-7, 6.830127019))
            ThreePointArc((-7, 6.830127019), (-7.5, 7.330127019), (-8, 6.830127019))
            Line((-8, 6.830127019), (-8, 1.830127019))
            ThreePointArc((-8, 1.830127019), (-7.5, 1.330127019), (-7, 1.830127019))
        make_face()
        with BuildLine():
            Line((-7, -6.830127019), (-7, -1.830127019))
            ThreePointArc((-7, -1.830127019), (-7.5, -1.330127019), (-8, -1.830127019))
            Line((-8, -1.830127019), (-8, -6.830127019))
            ThreePointArc((-8, -6.830127019), (-7.5, -7.330127019), (-7, -6.830127019))
        make_face()
        with BuildLine():
            Line((-4.5, -2.5), (-4.5, 2.5))
            ThreePointArc((-4.5, 2.5), (-5, 3), (-5.5, 2.5))
            Line((-5.5, 2.5), (-5.5, -2.5))
            ThreePointArc((-5.5, -2.5), (-5, -3), (-4.5, -2.5))
        make_face()
        with BuildLine():
            Line((3, 1.830127019), (3, 6.830127019))
            ThreePointArc((3, 6.830127019), (2.5, 7.330127019), (2, 6.830127019))
            Line((2, 6.830127019), (2, 1.830127019))
            ThreePointArc((2, 1.830127019), (2.5, 1.330127019), (3, 1.830127019))
        make_face()
        with BuildLine():
            Line((3, -6.830127019), (3, -1.830127019))
            ThreePointArc((3, -1.830127019), (2.5, -1.330127019), (2, -1.830127019))
            Line((2, -1.830127019), (2, -6.830127019))
            ThreePointArc((2, -6.830127019), (2.5, -7.330127019), (3, -6.830127019))
        make_face()
        with BuildLine():
            Line((-2, 1.830127019), (-2, 6.830127019))
            ThreePointArc((-2, 6.830127019), (-2.5, 7.330127019), (-3, 6.830127019))
            Line((-3, 6.830127019), (-3, 1.830127019))
            ThreePointArc((-3, 1.830127019), (-2.5, 1.330127019), (-2, 1.830127019))
        make_face()
        with BuildLine():
            Line((-2, -6.830127019), (-2, -1.830127019))
            ThreePointArc((-2, -1.830127019), (-2.5, -1.330127019), (-3, -1.830127019))
            Line((-3, -1.830127019), (-3, -6.830127019))
            ThreePointArc((-3, -6.830127019), (-2.5, -7.330127019), (-2, -6.830127019))
        make_face()
    extrude(amount=FILL_PATTERN1_DEPTH, mode=Mode.SUBTRACT)

    # Sketch2 → Boss-Extrude2 (add, symmetric)
    with BuildSketch(Plane(origin=(0, 0, 0), x_dir=(1, 0, 0), z_dir=(0, 1, 0))):
        with Locations((-20, 0)):
            Rectangle(SKETCH2_W, SKETCH2_H)
        with Locations((20, 0)):
            Rectangle(SKETCH2_W, SKETCH2_H)
    extrude(amount=BOSS_EXTRUDE2_DEPTH, both=True)


solid = part.part
